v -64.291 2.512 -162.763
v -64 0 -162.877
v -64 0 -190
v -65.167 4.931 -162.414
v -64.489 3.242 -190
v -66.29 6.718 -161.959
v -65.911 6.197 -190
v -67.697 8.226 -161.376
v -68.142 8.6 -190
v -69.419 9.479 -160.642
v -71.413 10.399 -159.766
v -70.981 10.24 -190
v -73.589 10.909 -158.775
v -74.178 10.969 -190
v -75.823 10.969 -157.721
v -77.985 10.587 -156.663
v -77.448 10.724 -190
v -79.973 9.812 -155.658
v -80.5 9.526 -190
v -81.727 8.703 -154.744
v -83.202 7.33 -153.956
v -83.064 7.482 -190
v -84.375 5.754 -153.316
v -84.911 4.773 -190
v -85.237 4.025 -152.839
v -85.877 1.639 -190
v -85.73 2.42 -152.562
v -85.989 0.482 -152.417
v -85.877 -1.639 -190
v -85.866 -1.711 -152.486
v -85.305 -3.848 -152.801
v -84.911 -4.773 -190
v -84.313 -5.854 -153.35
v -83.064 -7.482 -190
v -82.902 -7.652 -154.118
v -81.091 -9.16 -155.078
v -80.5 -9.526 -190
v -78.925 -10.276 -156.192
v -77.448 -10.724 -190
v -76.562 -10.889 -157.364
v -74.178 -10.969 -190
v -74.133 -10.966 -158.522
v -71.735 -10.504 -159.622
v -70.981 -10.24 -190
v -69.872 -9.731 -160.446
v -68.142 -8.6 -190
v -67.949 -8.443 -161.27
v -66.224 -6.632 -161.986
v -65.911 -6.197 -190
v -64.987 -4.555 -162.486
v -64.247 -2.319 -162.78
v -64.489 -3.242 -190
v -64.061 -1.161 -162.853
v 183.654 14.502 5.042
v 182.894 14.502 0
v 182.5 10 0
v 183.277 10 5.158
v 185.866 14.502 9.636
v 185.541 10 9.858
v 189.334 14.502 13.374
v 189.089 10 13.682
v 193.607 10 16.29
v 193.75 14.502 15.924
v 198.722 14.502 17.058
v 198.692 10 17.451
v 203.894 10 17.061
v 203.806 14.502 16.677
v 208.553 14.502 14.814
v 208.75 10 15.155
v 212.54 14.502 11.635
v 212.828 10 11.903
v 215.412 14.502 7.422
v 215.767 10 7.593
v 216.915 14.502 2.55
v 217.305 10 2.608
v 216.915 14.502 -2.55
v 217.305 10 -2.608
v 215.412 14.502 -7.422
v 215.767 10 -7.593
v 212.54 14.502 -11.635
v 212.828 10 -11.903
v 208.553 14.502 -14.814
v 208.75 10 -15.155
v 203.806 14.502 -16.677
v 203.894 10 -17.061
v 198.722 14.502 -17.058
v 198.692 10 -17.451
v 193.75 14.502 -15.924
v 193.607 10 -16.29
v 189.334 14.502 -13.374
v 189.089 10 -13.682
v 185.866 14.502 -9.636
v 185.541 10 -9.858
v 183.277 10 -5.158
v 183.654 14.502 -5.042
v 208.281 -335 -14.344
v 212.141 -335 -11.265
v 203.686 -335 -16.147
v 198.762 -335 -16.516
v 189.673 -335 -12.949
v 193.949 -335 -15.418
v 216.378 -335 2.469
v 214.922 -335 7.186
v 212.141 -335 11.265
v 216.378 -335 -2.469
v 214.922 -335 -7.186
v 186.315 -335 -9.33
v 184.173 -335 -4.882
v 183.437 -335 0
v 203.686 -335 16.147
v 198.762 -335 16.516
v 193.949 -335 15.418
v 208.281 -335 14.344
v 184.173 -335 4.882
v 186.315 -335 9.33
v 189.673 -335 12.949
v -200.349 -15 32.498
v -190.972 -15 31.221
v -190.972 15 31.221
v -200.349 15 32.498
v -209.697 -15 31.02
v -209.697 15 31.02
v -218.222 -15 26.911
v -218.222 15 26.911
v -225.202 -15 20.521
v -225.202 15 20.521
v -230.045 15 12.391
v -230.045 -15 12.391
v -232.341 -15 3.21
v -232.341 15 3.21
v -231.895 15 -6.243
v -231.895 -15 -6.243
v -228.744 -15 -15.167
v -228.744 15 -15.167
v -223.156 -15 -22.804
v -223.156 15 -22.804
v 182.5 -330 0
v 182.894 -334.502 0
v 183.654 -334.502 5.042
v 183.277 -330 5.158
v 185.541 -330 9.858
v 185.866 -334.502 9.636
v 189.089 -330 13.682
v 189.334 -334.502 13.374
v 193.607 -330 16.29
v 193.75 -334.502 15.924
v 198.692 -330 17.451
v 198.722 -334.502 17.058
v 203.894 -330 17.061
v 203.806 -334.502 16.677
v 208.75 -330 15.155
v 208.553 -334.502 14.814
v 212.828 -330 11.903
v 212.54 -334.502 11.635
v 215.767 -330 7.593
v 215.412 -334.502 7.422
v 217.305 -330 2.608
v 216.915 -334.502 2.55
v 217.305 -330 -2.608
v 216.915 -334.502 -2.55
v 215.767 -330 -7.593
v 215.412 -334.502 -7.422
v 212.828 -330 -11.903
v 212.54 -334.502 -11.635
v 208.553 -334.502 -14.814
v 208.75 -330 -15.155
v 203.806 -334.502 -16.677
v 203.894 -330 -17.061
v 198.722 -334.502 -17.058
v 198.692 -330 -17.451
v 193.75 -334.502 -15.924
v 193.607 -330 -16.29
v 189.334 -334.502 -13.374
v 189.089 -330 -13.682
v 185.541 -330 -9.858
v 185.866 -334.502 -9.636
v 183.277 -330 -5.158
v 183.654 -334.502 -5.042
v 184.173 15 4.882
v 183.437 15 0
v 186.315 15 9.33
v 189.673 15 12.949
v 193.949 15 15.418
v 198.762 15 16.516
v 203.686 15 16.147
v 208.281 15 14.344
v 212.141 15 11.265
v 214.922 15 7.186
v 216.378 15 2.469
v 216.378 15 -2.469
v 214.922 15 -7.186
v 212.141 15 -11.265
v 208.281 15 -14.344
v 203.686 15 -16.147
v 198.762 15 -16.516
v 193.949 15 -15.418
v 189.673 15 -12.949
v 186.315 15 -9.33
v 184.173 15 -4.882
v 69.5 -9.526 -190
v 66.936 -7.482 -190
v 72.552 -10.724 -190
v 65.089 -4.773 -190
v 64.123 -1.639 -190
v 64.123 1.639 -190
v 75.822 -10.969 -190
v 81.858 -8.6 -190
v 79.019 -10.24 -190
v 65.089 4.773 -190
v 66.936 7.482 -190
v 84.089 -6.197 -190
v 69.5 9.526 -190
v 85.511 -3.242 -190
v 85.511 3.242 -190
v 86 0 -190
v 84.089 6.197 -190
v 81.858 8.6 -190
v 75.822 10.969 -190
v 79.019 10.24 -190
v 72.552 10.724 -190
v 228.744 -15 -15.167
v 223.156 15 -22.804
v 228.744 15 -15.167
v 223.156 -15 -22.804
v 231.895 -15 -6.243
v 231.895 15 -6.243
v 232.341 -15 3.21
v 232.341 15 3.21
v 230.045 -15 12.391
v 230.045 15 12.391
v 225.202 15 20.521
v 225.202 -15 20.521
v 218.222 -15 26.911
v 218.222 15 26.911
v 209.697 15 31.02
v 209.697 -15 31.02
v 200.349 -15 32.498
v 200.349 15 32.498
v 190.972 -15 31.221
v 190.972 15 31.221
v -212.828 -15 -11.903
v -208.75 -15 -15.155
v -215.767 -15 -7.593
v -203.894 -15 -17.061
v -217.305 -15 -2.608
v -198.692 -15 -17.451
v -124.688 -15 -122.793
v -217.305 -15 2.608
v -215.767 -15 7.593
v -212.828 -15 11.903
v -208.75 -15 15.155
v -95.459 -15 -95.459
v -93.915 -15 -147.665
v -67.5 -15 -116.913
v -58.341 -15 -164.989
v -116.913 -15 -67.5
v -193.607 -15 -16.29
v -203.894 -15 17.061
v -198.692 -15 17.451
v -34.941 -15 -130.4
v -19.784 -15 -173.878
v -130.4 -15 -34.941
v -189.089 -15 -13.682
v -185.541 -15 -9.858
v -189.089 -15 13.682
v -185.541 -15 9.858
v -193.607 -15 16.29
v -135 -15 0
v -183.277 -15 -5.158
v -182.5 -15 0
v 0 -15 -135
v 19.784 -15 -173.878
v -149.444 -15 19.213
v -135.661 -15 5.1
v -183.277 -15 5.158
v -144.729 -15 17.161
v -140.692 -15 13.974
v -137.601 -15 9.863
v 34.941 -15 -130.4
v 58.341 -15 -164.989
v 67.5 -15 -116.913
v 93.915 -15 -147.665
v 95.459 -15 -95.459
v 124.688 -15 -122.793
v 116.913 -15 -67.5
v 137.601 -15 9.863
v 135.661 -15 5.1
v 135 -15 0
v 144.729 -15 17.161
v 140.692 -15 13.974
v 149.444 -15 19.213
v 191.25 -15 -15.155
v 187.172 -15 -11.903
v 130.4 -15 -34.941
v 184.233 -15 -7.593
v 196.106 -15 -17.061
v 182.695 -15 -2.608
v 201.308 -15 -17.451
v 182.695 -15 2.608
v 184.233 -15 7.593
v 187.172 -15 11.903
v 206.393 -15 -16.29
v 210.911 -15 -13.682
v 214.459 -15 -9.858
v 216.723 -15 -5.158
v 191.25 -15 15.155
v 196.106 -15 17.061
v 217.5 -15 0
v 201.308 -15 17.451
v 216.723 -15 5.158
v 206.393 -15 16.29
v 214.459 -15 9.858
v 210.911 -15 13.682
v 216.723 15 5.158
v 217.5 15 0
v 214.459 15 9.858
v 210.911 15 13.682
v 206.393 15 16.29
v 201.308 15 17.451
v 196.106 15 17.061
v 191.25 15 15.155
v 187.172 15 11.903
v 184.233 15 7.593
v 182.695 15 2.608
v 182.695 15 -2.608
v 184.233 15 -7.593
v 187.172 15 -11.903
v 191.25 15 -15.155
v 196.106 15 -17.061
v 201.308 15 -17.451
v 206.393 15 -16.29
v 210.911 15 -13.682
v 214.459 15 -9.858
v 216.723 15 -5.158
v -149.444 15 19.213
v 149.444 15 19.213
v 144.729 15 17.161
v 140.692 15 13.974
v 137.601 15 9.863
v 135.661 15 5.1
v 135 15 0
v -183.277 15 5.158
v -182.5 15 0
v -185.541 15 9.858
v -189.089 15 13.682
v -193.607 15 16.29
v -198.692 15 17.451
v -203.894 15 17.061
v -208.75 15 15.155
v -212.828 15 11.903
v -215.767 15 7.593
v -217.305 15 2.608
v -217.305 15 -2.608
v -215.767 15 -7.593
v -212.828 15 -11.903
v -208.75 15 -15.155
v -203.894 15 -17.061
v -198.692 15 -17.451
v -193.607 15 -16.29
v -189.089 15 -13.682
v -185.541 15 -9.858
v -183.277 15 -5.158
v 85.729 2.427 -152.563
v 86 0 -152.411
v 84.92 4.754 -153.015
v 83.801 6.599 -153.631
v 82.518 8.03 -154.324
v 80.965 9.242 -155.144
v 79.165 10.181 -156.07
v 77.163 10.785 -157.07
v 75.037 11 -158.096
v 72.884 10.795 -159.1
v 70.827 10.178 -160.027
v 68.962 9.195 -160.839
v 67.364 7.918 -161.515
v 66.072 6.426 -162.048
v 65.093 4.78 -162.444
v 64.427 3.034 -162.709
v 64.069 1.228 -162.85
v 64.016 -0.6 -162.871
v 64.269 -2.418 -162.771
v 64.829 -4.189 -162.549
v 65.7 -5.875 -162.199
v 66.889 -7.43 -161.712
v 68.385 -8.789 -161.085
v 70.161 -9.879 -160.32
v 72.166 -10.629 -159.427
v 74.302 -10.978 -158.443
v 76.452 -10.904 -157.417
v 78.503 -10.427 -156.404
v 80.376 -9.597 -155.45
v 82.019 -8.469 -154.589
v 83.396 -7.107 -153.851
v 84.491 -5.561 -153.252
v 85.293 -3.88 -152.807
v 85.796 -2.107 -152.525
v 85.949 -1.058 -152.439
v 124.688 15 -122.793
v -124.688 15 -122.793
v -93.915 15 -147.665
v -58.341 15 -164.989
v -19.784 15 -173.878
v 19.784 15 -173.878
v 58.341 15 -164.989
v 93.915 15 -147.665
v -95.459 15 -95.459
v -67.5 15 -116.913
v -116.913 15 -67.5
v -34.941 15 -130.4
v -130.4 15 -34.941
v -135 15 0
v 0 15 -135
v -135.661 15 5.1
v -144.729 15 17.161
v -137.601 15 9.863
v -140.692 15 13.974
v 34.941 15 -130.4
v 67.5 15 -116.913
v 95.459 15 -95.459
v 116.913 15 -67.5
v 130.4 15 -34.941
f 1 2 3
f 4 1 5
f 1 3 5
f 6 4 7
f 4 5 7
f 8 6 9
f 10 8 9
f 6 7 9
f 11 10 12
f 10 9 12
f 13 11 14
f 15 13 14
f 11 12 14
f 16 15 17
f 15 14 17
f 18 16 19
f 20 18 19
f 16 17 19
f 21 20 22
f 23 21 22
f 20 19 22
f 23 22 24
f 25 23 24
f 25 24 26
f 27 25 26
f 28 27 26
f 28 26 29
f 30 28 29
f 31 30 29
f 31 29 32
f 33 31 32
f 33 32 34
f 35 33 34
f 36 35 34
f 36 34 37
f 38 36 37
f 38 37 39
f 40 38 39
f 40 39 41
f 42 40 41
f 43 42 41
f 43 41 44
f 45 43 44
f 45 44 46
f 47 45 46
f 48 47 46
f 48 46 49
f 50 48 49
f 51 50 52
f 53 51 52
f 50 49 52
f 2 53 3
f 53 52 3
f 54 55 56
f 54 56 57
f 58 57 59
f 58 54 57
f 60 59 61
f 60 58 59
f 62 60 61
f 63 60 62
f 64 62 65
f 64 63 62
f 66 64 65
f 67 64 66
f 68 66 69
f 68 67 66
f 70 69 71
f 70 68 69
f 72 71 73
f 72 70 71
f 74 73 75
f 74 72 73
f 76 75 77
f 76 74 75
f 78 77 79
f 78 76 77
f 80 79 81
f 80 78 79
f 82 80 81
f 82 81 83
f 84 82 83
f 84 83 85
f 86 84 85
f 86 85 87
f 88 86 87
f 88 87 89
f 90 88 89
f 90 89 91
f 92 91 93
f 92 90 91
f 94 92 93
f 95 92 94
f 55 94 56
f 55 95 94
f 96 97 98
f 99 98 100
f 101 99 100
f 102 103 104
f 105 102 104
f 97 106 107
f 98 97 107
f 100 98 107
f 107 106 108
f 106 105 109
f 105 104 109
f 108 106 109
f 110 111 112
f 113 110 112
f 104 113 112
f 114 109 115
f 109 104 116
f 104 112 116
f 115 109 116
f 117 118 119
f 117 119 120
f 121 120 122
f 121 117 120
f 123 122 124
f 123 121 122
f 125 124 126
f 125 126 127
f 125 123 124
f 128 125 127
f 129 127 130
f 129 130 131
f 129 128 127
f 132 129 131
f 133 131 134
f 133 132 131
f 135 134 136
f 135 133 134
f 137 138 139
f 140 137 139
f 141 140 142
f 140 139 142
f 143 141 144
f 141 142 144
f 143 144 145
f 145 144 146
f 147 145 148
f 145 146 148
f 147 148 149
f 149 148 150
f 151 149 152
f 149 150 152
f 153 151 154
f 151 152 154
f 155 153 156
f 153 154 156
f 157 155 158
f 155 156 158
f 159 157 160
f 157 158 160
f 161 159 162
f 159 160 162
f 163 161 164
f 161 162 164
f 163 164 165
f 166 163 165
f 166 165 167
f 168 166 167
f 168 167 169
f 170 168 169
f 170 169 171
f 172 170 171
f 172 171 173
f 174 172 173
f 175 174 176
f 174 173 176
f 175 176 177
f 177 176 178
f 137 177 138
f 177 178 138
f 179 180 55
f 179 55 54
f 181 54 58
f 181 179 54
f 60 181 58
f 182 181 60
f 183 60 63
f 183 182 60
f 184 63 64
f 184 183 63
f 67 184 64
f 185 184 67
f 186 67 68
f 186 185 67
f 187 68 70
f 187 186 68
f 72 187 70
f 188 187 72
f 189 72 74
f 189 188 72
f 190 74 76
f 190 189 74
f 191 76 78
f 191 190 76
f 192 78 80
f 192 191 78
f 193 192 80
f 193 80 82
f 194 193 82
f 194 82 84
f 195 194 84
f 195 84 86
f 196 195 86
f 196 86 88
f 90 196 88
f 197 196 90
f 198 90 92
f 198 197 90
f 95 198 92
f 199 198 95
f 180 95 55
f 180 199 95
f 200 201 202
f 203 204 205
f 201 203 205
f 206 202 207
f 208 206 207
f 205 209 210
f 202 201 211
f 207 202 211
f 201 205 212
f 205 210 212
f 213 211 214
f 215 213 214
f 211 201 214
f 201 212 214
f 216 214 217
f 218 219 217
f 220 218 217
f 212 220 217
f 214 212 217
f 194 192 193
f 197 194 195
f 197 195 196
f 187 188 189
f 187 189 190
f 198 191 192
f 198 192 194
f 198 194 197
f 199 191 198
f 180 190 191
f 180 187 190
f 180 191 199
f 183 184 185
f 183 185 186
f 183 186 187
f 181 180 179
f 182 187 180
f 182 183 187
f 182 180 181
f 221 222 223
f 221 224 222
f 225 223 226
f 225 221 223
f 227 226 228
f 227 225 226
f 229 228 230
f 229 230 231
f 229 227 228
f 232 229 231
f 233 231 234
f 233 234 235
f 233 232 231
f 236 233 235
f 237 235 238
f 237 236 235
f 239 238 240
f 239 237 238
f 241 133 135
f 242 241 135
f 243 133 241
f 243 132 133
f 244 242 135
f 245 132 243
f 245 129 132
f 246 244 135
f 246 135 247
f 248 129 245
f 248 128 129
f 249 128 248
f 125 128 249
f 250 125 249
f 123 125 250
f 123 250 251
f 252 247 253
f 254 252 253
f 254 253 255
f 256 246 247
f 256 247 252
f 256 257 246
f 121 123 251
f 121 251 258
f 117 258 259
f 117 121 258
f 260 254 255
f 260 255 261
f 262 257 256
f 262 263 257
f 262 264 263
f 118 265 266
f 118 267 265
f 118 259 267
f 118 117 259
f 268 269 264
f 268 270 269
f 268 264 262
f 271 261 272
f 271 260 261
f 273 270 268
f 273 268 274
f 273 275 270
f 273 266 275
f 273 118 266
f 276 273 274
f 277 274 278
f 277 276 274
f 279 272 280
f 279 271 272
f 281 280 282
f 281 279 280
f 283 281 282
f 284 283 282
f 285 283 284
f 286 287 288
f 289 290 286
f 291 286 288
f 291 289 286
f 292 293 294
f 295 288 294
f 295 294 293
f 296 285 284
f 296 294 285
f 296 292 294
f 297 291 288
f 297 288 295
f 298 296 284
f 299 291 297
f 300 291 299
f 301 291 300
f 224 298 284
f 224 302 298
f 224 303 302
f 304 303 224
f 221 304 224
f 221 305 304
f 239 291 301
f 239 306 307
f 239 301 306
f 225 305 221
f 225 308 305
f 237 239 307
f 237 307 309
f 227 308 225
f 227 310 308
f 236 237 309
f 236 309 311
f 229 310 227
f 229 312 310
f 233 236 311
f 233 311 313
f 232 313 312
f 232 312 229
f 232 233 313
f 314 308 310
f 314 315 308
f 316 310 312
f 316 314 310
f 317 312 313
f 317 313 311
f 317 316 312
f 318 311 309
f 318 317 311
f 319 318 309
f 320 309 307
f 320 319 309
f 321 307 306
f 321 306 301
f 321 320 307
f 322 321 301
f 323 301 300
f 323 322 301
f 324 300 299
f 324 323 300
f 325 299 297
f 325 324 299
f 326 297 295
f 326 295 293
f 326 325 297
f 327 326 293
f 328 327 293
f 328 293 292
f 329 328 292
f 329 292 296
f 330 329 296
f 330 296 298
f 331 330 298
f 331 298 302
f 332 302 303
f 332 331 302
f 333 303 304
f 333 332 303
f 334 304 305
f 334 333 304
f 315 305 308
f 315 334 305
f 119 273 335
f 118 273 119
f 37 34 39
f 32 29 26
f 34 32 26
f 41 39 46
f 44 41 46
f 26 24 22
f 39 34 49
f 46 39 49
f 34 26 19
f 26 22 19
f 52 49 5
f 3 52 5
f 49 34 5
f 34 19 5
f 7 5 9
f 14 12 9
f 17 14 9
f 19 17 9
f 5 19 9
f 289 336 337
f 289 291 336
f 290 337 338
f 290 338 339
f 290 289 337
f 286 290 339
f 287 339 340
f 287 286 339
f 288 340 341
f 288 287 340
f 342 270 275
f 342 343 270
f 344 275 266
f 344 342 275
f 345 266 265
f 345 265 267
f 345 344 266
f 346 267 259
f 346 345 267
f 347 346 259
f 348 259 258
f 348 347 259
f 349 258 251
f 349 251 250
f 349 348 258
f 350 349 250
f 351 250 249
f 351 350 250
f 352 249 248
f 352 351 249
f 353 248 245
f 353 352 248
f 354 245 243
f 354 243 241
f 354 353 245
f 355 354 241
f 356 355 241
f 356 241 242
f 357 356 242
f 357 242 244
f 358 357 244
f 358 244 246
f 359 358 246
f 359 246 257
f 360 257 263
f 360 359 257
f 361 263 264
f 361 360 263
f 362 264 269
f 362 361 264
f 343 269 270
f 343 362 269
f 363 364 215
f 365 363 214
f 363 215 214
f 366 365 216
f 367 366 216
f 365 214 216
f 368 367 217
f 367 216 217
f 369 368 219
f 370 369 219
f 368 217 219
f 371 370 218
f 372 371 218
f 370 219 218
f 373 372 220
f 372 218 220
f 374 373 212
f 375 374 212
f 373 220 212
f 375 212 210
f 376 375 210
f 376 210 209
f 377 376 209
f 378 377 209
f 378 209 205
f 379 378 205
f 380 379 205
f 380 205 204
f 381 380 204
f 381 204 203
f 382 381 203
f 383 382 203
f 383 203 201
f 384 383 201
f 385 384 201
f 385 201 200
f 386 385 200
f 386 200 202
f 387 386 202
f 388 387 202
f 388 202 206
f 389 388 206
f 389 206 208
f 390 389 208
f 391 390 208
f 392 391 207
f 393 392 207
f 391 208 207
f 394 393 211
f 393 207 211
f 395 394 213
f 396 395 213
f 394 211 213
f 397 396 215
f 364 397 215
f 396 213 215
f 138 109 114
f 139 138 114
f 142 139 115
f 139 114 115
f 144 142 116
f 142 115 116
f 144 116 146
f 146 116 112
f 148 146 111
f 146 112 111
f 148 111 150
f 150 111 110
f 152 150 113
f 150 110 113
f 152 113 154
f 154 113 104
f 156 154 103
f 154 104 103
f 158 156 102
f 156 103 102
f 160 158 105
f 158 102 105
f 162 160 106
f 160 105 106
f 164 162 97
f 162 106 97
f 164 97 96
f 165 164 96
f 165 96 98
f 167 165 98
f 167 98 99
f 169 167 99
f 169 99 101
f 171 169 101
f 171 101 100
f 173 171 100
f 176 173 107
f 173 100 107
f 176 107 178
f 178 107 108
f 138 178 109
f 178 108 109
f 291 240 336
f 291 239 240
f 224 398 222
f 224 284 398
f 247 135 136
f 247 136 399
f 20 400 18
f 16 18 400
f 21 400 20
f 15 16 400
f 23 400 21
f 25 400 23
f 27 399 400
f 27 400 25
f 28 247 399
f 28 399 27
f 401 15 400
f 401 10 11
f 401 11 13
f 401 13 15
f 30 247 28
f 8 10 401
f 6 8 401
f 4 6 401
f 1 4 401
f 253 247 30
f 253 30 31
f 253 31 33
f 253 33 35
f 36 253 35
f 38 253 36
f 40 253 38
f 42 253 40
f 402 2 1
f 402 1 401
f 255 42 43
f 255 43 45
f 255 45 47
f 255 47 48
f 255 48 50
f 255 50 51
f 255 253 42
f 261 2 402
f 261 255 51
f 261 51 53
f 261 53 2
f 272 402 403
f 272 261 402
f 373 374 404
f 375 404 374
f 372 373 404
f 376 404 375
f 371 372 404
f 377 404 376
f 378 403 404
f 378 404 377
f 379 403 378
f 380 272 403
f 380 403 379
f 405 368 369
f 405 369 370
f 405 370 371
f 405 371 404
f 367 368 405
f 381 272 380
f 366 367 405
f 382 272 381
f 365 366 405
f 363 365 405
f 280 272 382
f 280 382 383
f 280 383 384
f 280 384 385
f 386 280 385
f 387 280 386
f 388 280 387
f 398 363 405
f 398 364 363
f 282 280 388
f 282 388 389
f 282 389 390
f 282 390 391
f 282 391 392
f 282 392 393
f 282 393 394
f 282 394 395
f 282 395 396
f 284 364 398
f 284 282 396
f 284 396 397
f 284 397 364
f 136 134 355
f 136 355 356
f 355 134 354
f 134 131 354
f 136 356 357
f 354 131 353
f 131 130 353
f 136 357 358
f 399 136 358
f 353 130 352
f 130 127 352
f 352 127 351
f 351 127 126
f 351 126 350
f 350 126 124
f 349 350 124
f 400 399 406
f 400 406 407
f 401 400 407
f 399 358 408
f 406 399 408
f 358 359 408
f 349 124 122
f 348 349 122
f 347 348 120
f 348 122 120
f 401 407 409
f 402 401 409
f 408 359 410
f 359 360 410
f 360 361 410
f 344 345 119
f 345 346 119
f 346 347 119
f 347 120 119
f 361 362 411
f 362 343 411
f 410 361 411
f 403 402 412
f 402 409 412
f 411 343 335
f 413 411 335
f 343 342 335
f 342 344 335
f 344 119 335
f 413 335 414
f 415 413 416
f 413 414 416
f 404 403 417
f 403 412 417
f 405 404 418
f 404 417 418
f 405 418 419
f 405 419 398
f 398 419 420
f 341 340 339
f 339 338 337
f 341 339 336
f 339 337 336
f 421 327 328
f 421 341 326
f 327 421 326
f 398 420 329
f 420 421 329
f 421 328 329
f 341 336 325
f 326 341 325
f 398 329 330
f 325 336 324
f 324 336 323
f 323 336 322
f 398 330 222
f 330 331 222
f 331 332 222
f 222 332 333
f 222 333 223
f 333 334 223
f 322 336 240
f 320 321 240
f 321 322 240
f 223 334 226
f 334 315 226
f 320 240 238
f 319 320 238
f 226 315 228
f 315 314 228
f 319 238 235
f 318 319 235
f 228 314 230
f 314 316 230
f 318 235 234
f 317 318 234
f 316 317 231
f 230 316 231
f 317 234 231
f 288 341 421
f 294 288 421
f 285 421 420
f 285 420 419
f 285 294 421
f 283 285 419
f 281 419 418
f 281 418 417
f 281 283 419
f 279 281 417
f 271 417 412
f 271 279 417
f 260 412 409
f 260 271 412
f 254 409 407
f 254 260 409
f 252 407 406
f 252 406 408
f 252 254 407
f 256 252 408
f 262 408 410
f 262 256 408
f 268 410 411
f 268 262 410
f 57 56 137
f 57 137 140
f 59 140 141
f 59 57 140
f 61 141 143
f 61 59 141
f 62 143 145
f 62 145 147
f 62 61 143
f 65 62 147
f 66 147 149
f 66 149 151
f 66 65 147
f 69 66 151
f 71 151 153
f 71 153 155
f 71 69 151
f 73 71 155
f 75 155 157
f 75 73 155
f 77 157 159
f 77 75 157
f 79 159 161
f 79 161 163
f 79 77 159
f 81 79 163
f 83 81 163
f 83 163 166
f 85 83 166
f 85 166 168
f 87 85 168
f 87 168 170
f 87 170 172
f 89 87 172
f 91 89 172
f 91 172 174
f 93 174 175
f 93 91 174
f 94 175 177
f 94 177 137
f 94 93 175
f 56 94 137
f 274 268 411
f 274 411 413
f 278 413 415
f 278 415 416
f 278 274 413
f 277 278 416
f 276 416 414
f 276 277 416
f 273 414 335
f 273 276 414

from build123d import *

# Parameters (mm, degrees)
F1_R      = 17.5
F2_DEPTH  = 15
F4_R      = 11
F5_DEPTH  = 45
F6_R      = 17.5
F7_DEPTH  = 350
F8_SIZE2  = 0.4374433176
F8_SIZE   = 5
F9_SIZE   = 0.5
F10_SIZE2 = 0.4374433176
F10_SIZE  = 5
F11_SIZE  = 0.5


with BuildPart() as f2:
    # F1 (on Front) → F2 (new body, symmetric)
    with BuildSketch(Plane.XZ):
        with BuildLine():
            ThreePointArc((135, 0), (0, -135), (-135, 0))
            ThreePointArc((-135, 0), (-139.0138949223, 12.0185042515), (-149.4444444444, 19.2129071842))
            Line((-149.4444444444, 19.2129071842), (-190.9722222222, 31.2209741743))
            ThreePointArc((-190.9722222222, 31.2209741743), (-227.9210882908, 16.6331845615), (-223.15625, -22.8043435761))
            Line((-223.15625, -22.8043435761), (-124.6875, -122.792619256))
            ThreePointArc((-124.6875, -122.792619256), (0, -175), (124.6875, -122.792619256))
            Line((124.6875, -122.792619256), (223.15625, -22.8043435761))
            ThreePointArc((223.15625, -22.8043435761), (227.9210882908, 16.6331845615), (190.9722222222, 31.2209741743))
            Line((190.9722222222, 31.2209741743), (149.4444444444, 19.2129071842))
            ThreePointArc((149.4444444444, 19.2129071842), (139.0138949223, 12.0185042515), (135, 0))
        make_face()
        with Locations((-200, 0)):
            Circle(F1_R, mode=Mode.SUBTRACT)
        with Locations((200, 0)):
            Circle(F1_R, mode=Mode.SUBTRACT)
    extrude(amount=F2_DEPTH, both=True)

    # F4 (on offset) → F5 (join)
    with BuildSketch(Plane.XY.offset(-190)):
        with Locations((-75, 0)):
            Circle(F4_R)
        with Locations((75, 0)):
            Circle(F4_R)
    extrude(amount=F5_DEPTH)


with BuildPart() as f7:
    # F6 (on face) → F7 (new body)
    with BuildSketch(Plane(origin=(0, 15, 0), x_dir=(-1, 0, 0), z_dir=(0, 1, 0))):
        with Locations((-200, 0)):
            Circle(F6_R)
    extrude(amount=-F7_DEPTH)

    # F8
    f8_edges = [f7.edges().sort_by_distance(p)[0] for p in [
        (217.5, 15, 0),
    ]]
    f8_side = f7.faces().sort_by_distance((217.5, -160, 0))[0]
    chamfer(f8_edges, length=F8_SIZE, length2=F8_SIZE2, reference=f8_side)

    # F9
    f9_edges = [f7.edges().sort_by_distance(p)[0] for p in [
        (217.062557, 15, 0),
    ]]
    chamfer(f9_edges, length=F9_SIZE)

    # F10
    f10_edges = [f7.edges().sort_by_distance(p)[0] for p in [
        (217.5, -335, 0),
    ]]
    f10_side = f7.faces().sort_by_distance((217.5, -162.5, 0))[0]
    chamfer(f10_edges, length=F10_SIZE, length2=F10_SIZE2, reference=f10_side)

    # F11
    f11_edges = [f7.edges().sort_by_distance(p)[0] for p in [
        (217.062557, -335, 0),
    ]]
    chamfer(f11_edges, length=F11_SIZE)


solid = Compound([f2.part, f7.part])
